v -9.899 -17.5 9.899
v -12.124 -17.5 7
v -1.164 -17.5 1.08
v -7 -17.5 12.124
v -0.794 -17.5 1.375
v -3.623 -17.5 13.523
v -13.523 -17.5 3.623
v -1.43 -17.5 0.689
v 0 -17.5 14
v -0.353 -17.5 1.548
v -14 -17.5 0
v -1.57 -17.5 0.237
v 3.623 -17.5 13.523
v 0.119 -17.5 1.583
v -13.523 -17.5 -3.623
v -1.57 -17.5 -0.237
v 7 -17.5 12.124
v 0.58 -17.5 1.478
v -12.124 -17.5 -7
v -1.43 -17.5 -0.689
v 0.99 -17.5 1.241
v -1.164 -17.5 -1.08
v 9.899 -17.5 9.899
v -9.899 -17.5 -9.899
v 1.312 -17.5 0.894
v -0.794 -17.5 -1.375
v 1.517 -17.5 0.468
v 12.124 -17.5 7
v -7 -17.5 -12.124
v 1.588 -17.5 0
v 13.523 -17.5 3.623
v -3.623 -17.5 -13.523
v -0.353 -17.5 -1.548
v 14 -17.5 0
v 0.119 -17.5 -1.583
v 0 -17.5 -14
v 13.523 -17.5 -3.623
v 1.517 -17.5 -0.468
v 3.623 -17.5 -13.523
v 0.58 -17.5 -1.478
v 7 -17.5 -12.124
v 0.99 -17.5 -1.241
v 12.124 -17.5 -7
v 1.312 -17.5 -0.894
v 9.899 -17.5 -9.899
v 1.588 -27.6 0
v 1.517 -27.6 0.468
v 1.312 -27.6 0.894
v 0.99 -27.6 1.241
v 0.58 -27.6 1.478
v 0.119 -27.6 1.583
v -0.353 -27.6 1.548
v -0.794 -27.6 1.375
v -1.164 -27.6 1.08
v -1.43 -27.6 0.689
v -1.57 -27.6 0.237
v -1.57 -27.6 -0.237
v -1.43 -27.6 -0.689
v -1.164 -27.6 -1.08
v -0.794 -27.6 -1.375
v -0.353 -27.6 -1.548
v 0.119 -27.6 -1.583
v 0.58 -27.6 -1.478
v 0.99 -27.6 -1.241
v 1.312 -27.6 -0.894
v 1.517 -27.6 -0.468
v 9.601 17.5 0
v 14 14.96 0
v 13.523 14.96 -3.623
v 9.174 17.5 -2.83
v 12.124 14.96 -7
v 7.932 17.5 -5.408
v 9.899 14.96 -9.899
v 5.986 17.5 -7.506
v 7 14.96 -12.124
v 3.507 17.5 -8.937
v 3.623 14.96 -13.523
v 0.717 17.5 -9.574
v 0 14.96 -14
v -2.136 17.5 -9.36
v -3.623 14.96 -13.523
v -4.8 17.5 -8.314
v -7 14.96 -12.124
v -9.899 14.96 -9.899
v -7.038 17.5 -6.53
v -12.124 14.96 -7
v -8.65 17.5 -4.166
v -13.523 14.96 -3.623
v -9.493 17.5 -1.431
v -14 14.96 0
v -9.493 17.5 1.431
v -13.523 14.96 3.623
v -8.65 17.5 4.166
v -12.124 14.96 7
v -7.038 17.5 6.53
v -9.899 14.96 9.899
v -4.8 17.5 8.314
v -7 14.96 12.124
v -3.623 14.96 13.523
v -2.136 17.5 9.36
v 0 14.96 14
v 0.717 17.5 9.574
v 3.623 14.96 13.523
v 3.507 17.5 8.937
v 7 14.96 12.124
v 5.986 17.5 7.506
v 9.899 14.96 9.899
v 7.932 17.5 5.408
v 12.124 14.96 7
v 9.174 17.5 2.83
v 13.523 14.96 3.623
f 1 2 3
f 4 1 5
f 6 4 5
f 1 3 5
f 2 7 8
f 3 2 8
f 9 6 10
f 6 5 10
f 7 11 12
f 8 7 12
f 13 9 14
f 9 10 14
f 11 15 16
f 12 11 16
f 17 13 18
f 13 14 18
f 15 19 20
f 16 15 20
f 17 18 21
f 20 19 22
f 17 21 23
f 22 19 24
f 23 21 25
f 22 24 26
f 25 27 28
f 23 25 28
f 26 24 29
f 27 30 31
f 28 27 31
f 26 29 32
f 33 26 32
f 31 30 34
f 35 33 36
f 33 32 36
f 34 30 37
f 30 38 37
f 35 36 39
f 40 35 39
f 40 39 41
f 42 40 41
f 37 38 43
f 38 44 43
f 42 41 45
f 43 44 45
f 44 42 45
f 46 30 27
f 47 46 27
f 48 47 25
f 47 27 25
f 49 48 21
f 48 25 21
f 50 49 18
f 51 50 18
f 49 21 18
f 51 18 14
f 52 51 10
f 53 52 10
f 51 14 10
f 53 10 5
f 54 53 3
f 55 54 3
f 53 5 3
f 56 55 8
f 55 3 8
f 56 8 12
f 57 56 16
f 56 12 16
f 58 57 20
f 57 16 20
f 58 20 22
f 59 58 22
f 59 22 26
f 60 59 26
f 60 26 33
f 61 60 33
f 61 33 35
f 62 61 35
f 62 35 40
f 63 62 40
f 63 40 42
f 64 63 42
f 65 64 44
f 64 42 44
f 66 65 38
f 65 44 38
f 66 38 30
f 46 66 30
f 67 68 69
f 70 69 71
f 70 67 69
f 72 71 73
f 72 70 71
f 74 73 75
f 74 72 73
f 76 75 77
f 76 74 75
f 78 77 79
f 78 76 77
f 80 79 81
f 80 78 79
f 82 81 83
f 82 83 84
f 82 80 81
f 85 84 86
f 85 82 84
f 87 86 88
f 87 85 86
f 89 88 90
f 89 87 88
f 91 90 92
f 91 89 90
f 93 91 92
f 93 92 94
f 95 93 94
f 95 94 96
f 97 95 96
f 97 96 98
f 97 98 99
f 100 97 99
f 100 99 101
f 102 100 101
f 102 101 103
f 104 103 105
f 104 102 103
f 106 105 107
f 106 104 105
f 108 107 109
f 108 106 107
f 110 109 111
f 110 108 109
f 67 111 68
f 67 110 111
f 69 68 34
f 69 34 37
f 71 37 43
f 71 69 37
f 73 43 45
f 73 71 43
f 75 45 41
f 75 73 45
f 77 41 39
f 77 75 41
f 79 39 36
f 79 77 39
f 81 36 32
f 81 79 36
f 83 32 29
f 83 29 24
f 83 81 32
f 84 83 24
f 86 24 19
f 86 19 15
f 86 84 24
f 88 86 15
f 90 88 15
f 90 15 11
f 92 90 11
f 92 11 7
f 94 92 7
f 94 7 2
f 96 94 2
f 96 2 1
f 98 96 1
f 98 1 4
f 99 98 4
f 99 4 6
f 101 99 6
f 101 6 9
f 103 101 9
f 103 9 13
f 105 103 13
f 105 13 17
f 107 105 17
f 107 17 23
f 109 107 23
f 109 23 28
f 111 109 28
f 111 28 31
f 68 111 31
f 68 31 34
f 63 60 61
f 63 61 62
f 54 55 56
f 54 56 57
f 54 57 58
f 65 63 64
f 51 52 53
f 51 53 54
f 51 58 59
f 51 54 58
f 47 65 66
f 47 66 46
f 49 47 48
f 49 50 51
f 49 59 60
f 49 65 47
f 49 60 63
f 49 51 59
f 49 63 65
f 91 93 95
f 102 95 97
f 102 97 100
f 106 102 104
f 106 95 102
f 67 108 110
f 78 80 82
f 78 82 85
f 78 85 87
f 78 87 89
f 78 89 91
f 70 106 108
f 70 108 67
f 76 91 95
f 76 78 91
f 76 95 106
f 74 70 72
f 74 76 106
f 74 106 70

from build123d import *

# Parameters (mm, degrees)
SKETCH1_R           = 14
BOSS_EXTRUDE1_DEPTH = 17.5
CHAMFER1_SIZE       = 2.54
CHAMFER1_SIZE2      = 4.399409051
SKETCH2_R           = 1.5875
BOSS_EXTRUDE2_DEPTH = 10.1


with BuildPart() as part:
    # Sketch1 → Boss-Extrude1 (new body, symmetric)
    with BuildSketch(Plane(origin=(0, 0, 0), x_dir=(1, 0, 0), z_dir=(0, 1, 0))):
        Circle(SKETCH1_R)
    extrude(amount=BOSS_EXTRUDE1_DEPTH, both=True)

    # Chamfer1
    chamfer1_edges = [part.edges().sort_by_distance(p)[0] for p in [
        (-14, 17.5, 0),
    ]]
    chamfer1_side = [part.faces().sort_by_distance(p)[0] for p in [
        (-14, 0, 0),
    ]]
    chamfer(chamfer1_edges, length=CHAMFER1_SIZE, length2=CHAMFER1_SIZE2, reference=chamfer1_side[0])

    # Sketch2 → Boss-Extrude2 (add)
    with BuildSketch(Plane.XZ.offset(17.5)):
        Circle(SKETCH2_R)
    extrude(amount=BOSS_EXTRUDE2_DEPTH)


solid = part.part
